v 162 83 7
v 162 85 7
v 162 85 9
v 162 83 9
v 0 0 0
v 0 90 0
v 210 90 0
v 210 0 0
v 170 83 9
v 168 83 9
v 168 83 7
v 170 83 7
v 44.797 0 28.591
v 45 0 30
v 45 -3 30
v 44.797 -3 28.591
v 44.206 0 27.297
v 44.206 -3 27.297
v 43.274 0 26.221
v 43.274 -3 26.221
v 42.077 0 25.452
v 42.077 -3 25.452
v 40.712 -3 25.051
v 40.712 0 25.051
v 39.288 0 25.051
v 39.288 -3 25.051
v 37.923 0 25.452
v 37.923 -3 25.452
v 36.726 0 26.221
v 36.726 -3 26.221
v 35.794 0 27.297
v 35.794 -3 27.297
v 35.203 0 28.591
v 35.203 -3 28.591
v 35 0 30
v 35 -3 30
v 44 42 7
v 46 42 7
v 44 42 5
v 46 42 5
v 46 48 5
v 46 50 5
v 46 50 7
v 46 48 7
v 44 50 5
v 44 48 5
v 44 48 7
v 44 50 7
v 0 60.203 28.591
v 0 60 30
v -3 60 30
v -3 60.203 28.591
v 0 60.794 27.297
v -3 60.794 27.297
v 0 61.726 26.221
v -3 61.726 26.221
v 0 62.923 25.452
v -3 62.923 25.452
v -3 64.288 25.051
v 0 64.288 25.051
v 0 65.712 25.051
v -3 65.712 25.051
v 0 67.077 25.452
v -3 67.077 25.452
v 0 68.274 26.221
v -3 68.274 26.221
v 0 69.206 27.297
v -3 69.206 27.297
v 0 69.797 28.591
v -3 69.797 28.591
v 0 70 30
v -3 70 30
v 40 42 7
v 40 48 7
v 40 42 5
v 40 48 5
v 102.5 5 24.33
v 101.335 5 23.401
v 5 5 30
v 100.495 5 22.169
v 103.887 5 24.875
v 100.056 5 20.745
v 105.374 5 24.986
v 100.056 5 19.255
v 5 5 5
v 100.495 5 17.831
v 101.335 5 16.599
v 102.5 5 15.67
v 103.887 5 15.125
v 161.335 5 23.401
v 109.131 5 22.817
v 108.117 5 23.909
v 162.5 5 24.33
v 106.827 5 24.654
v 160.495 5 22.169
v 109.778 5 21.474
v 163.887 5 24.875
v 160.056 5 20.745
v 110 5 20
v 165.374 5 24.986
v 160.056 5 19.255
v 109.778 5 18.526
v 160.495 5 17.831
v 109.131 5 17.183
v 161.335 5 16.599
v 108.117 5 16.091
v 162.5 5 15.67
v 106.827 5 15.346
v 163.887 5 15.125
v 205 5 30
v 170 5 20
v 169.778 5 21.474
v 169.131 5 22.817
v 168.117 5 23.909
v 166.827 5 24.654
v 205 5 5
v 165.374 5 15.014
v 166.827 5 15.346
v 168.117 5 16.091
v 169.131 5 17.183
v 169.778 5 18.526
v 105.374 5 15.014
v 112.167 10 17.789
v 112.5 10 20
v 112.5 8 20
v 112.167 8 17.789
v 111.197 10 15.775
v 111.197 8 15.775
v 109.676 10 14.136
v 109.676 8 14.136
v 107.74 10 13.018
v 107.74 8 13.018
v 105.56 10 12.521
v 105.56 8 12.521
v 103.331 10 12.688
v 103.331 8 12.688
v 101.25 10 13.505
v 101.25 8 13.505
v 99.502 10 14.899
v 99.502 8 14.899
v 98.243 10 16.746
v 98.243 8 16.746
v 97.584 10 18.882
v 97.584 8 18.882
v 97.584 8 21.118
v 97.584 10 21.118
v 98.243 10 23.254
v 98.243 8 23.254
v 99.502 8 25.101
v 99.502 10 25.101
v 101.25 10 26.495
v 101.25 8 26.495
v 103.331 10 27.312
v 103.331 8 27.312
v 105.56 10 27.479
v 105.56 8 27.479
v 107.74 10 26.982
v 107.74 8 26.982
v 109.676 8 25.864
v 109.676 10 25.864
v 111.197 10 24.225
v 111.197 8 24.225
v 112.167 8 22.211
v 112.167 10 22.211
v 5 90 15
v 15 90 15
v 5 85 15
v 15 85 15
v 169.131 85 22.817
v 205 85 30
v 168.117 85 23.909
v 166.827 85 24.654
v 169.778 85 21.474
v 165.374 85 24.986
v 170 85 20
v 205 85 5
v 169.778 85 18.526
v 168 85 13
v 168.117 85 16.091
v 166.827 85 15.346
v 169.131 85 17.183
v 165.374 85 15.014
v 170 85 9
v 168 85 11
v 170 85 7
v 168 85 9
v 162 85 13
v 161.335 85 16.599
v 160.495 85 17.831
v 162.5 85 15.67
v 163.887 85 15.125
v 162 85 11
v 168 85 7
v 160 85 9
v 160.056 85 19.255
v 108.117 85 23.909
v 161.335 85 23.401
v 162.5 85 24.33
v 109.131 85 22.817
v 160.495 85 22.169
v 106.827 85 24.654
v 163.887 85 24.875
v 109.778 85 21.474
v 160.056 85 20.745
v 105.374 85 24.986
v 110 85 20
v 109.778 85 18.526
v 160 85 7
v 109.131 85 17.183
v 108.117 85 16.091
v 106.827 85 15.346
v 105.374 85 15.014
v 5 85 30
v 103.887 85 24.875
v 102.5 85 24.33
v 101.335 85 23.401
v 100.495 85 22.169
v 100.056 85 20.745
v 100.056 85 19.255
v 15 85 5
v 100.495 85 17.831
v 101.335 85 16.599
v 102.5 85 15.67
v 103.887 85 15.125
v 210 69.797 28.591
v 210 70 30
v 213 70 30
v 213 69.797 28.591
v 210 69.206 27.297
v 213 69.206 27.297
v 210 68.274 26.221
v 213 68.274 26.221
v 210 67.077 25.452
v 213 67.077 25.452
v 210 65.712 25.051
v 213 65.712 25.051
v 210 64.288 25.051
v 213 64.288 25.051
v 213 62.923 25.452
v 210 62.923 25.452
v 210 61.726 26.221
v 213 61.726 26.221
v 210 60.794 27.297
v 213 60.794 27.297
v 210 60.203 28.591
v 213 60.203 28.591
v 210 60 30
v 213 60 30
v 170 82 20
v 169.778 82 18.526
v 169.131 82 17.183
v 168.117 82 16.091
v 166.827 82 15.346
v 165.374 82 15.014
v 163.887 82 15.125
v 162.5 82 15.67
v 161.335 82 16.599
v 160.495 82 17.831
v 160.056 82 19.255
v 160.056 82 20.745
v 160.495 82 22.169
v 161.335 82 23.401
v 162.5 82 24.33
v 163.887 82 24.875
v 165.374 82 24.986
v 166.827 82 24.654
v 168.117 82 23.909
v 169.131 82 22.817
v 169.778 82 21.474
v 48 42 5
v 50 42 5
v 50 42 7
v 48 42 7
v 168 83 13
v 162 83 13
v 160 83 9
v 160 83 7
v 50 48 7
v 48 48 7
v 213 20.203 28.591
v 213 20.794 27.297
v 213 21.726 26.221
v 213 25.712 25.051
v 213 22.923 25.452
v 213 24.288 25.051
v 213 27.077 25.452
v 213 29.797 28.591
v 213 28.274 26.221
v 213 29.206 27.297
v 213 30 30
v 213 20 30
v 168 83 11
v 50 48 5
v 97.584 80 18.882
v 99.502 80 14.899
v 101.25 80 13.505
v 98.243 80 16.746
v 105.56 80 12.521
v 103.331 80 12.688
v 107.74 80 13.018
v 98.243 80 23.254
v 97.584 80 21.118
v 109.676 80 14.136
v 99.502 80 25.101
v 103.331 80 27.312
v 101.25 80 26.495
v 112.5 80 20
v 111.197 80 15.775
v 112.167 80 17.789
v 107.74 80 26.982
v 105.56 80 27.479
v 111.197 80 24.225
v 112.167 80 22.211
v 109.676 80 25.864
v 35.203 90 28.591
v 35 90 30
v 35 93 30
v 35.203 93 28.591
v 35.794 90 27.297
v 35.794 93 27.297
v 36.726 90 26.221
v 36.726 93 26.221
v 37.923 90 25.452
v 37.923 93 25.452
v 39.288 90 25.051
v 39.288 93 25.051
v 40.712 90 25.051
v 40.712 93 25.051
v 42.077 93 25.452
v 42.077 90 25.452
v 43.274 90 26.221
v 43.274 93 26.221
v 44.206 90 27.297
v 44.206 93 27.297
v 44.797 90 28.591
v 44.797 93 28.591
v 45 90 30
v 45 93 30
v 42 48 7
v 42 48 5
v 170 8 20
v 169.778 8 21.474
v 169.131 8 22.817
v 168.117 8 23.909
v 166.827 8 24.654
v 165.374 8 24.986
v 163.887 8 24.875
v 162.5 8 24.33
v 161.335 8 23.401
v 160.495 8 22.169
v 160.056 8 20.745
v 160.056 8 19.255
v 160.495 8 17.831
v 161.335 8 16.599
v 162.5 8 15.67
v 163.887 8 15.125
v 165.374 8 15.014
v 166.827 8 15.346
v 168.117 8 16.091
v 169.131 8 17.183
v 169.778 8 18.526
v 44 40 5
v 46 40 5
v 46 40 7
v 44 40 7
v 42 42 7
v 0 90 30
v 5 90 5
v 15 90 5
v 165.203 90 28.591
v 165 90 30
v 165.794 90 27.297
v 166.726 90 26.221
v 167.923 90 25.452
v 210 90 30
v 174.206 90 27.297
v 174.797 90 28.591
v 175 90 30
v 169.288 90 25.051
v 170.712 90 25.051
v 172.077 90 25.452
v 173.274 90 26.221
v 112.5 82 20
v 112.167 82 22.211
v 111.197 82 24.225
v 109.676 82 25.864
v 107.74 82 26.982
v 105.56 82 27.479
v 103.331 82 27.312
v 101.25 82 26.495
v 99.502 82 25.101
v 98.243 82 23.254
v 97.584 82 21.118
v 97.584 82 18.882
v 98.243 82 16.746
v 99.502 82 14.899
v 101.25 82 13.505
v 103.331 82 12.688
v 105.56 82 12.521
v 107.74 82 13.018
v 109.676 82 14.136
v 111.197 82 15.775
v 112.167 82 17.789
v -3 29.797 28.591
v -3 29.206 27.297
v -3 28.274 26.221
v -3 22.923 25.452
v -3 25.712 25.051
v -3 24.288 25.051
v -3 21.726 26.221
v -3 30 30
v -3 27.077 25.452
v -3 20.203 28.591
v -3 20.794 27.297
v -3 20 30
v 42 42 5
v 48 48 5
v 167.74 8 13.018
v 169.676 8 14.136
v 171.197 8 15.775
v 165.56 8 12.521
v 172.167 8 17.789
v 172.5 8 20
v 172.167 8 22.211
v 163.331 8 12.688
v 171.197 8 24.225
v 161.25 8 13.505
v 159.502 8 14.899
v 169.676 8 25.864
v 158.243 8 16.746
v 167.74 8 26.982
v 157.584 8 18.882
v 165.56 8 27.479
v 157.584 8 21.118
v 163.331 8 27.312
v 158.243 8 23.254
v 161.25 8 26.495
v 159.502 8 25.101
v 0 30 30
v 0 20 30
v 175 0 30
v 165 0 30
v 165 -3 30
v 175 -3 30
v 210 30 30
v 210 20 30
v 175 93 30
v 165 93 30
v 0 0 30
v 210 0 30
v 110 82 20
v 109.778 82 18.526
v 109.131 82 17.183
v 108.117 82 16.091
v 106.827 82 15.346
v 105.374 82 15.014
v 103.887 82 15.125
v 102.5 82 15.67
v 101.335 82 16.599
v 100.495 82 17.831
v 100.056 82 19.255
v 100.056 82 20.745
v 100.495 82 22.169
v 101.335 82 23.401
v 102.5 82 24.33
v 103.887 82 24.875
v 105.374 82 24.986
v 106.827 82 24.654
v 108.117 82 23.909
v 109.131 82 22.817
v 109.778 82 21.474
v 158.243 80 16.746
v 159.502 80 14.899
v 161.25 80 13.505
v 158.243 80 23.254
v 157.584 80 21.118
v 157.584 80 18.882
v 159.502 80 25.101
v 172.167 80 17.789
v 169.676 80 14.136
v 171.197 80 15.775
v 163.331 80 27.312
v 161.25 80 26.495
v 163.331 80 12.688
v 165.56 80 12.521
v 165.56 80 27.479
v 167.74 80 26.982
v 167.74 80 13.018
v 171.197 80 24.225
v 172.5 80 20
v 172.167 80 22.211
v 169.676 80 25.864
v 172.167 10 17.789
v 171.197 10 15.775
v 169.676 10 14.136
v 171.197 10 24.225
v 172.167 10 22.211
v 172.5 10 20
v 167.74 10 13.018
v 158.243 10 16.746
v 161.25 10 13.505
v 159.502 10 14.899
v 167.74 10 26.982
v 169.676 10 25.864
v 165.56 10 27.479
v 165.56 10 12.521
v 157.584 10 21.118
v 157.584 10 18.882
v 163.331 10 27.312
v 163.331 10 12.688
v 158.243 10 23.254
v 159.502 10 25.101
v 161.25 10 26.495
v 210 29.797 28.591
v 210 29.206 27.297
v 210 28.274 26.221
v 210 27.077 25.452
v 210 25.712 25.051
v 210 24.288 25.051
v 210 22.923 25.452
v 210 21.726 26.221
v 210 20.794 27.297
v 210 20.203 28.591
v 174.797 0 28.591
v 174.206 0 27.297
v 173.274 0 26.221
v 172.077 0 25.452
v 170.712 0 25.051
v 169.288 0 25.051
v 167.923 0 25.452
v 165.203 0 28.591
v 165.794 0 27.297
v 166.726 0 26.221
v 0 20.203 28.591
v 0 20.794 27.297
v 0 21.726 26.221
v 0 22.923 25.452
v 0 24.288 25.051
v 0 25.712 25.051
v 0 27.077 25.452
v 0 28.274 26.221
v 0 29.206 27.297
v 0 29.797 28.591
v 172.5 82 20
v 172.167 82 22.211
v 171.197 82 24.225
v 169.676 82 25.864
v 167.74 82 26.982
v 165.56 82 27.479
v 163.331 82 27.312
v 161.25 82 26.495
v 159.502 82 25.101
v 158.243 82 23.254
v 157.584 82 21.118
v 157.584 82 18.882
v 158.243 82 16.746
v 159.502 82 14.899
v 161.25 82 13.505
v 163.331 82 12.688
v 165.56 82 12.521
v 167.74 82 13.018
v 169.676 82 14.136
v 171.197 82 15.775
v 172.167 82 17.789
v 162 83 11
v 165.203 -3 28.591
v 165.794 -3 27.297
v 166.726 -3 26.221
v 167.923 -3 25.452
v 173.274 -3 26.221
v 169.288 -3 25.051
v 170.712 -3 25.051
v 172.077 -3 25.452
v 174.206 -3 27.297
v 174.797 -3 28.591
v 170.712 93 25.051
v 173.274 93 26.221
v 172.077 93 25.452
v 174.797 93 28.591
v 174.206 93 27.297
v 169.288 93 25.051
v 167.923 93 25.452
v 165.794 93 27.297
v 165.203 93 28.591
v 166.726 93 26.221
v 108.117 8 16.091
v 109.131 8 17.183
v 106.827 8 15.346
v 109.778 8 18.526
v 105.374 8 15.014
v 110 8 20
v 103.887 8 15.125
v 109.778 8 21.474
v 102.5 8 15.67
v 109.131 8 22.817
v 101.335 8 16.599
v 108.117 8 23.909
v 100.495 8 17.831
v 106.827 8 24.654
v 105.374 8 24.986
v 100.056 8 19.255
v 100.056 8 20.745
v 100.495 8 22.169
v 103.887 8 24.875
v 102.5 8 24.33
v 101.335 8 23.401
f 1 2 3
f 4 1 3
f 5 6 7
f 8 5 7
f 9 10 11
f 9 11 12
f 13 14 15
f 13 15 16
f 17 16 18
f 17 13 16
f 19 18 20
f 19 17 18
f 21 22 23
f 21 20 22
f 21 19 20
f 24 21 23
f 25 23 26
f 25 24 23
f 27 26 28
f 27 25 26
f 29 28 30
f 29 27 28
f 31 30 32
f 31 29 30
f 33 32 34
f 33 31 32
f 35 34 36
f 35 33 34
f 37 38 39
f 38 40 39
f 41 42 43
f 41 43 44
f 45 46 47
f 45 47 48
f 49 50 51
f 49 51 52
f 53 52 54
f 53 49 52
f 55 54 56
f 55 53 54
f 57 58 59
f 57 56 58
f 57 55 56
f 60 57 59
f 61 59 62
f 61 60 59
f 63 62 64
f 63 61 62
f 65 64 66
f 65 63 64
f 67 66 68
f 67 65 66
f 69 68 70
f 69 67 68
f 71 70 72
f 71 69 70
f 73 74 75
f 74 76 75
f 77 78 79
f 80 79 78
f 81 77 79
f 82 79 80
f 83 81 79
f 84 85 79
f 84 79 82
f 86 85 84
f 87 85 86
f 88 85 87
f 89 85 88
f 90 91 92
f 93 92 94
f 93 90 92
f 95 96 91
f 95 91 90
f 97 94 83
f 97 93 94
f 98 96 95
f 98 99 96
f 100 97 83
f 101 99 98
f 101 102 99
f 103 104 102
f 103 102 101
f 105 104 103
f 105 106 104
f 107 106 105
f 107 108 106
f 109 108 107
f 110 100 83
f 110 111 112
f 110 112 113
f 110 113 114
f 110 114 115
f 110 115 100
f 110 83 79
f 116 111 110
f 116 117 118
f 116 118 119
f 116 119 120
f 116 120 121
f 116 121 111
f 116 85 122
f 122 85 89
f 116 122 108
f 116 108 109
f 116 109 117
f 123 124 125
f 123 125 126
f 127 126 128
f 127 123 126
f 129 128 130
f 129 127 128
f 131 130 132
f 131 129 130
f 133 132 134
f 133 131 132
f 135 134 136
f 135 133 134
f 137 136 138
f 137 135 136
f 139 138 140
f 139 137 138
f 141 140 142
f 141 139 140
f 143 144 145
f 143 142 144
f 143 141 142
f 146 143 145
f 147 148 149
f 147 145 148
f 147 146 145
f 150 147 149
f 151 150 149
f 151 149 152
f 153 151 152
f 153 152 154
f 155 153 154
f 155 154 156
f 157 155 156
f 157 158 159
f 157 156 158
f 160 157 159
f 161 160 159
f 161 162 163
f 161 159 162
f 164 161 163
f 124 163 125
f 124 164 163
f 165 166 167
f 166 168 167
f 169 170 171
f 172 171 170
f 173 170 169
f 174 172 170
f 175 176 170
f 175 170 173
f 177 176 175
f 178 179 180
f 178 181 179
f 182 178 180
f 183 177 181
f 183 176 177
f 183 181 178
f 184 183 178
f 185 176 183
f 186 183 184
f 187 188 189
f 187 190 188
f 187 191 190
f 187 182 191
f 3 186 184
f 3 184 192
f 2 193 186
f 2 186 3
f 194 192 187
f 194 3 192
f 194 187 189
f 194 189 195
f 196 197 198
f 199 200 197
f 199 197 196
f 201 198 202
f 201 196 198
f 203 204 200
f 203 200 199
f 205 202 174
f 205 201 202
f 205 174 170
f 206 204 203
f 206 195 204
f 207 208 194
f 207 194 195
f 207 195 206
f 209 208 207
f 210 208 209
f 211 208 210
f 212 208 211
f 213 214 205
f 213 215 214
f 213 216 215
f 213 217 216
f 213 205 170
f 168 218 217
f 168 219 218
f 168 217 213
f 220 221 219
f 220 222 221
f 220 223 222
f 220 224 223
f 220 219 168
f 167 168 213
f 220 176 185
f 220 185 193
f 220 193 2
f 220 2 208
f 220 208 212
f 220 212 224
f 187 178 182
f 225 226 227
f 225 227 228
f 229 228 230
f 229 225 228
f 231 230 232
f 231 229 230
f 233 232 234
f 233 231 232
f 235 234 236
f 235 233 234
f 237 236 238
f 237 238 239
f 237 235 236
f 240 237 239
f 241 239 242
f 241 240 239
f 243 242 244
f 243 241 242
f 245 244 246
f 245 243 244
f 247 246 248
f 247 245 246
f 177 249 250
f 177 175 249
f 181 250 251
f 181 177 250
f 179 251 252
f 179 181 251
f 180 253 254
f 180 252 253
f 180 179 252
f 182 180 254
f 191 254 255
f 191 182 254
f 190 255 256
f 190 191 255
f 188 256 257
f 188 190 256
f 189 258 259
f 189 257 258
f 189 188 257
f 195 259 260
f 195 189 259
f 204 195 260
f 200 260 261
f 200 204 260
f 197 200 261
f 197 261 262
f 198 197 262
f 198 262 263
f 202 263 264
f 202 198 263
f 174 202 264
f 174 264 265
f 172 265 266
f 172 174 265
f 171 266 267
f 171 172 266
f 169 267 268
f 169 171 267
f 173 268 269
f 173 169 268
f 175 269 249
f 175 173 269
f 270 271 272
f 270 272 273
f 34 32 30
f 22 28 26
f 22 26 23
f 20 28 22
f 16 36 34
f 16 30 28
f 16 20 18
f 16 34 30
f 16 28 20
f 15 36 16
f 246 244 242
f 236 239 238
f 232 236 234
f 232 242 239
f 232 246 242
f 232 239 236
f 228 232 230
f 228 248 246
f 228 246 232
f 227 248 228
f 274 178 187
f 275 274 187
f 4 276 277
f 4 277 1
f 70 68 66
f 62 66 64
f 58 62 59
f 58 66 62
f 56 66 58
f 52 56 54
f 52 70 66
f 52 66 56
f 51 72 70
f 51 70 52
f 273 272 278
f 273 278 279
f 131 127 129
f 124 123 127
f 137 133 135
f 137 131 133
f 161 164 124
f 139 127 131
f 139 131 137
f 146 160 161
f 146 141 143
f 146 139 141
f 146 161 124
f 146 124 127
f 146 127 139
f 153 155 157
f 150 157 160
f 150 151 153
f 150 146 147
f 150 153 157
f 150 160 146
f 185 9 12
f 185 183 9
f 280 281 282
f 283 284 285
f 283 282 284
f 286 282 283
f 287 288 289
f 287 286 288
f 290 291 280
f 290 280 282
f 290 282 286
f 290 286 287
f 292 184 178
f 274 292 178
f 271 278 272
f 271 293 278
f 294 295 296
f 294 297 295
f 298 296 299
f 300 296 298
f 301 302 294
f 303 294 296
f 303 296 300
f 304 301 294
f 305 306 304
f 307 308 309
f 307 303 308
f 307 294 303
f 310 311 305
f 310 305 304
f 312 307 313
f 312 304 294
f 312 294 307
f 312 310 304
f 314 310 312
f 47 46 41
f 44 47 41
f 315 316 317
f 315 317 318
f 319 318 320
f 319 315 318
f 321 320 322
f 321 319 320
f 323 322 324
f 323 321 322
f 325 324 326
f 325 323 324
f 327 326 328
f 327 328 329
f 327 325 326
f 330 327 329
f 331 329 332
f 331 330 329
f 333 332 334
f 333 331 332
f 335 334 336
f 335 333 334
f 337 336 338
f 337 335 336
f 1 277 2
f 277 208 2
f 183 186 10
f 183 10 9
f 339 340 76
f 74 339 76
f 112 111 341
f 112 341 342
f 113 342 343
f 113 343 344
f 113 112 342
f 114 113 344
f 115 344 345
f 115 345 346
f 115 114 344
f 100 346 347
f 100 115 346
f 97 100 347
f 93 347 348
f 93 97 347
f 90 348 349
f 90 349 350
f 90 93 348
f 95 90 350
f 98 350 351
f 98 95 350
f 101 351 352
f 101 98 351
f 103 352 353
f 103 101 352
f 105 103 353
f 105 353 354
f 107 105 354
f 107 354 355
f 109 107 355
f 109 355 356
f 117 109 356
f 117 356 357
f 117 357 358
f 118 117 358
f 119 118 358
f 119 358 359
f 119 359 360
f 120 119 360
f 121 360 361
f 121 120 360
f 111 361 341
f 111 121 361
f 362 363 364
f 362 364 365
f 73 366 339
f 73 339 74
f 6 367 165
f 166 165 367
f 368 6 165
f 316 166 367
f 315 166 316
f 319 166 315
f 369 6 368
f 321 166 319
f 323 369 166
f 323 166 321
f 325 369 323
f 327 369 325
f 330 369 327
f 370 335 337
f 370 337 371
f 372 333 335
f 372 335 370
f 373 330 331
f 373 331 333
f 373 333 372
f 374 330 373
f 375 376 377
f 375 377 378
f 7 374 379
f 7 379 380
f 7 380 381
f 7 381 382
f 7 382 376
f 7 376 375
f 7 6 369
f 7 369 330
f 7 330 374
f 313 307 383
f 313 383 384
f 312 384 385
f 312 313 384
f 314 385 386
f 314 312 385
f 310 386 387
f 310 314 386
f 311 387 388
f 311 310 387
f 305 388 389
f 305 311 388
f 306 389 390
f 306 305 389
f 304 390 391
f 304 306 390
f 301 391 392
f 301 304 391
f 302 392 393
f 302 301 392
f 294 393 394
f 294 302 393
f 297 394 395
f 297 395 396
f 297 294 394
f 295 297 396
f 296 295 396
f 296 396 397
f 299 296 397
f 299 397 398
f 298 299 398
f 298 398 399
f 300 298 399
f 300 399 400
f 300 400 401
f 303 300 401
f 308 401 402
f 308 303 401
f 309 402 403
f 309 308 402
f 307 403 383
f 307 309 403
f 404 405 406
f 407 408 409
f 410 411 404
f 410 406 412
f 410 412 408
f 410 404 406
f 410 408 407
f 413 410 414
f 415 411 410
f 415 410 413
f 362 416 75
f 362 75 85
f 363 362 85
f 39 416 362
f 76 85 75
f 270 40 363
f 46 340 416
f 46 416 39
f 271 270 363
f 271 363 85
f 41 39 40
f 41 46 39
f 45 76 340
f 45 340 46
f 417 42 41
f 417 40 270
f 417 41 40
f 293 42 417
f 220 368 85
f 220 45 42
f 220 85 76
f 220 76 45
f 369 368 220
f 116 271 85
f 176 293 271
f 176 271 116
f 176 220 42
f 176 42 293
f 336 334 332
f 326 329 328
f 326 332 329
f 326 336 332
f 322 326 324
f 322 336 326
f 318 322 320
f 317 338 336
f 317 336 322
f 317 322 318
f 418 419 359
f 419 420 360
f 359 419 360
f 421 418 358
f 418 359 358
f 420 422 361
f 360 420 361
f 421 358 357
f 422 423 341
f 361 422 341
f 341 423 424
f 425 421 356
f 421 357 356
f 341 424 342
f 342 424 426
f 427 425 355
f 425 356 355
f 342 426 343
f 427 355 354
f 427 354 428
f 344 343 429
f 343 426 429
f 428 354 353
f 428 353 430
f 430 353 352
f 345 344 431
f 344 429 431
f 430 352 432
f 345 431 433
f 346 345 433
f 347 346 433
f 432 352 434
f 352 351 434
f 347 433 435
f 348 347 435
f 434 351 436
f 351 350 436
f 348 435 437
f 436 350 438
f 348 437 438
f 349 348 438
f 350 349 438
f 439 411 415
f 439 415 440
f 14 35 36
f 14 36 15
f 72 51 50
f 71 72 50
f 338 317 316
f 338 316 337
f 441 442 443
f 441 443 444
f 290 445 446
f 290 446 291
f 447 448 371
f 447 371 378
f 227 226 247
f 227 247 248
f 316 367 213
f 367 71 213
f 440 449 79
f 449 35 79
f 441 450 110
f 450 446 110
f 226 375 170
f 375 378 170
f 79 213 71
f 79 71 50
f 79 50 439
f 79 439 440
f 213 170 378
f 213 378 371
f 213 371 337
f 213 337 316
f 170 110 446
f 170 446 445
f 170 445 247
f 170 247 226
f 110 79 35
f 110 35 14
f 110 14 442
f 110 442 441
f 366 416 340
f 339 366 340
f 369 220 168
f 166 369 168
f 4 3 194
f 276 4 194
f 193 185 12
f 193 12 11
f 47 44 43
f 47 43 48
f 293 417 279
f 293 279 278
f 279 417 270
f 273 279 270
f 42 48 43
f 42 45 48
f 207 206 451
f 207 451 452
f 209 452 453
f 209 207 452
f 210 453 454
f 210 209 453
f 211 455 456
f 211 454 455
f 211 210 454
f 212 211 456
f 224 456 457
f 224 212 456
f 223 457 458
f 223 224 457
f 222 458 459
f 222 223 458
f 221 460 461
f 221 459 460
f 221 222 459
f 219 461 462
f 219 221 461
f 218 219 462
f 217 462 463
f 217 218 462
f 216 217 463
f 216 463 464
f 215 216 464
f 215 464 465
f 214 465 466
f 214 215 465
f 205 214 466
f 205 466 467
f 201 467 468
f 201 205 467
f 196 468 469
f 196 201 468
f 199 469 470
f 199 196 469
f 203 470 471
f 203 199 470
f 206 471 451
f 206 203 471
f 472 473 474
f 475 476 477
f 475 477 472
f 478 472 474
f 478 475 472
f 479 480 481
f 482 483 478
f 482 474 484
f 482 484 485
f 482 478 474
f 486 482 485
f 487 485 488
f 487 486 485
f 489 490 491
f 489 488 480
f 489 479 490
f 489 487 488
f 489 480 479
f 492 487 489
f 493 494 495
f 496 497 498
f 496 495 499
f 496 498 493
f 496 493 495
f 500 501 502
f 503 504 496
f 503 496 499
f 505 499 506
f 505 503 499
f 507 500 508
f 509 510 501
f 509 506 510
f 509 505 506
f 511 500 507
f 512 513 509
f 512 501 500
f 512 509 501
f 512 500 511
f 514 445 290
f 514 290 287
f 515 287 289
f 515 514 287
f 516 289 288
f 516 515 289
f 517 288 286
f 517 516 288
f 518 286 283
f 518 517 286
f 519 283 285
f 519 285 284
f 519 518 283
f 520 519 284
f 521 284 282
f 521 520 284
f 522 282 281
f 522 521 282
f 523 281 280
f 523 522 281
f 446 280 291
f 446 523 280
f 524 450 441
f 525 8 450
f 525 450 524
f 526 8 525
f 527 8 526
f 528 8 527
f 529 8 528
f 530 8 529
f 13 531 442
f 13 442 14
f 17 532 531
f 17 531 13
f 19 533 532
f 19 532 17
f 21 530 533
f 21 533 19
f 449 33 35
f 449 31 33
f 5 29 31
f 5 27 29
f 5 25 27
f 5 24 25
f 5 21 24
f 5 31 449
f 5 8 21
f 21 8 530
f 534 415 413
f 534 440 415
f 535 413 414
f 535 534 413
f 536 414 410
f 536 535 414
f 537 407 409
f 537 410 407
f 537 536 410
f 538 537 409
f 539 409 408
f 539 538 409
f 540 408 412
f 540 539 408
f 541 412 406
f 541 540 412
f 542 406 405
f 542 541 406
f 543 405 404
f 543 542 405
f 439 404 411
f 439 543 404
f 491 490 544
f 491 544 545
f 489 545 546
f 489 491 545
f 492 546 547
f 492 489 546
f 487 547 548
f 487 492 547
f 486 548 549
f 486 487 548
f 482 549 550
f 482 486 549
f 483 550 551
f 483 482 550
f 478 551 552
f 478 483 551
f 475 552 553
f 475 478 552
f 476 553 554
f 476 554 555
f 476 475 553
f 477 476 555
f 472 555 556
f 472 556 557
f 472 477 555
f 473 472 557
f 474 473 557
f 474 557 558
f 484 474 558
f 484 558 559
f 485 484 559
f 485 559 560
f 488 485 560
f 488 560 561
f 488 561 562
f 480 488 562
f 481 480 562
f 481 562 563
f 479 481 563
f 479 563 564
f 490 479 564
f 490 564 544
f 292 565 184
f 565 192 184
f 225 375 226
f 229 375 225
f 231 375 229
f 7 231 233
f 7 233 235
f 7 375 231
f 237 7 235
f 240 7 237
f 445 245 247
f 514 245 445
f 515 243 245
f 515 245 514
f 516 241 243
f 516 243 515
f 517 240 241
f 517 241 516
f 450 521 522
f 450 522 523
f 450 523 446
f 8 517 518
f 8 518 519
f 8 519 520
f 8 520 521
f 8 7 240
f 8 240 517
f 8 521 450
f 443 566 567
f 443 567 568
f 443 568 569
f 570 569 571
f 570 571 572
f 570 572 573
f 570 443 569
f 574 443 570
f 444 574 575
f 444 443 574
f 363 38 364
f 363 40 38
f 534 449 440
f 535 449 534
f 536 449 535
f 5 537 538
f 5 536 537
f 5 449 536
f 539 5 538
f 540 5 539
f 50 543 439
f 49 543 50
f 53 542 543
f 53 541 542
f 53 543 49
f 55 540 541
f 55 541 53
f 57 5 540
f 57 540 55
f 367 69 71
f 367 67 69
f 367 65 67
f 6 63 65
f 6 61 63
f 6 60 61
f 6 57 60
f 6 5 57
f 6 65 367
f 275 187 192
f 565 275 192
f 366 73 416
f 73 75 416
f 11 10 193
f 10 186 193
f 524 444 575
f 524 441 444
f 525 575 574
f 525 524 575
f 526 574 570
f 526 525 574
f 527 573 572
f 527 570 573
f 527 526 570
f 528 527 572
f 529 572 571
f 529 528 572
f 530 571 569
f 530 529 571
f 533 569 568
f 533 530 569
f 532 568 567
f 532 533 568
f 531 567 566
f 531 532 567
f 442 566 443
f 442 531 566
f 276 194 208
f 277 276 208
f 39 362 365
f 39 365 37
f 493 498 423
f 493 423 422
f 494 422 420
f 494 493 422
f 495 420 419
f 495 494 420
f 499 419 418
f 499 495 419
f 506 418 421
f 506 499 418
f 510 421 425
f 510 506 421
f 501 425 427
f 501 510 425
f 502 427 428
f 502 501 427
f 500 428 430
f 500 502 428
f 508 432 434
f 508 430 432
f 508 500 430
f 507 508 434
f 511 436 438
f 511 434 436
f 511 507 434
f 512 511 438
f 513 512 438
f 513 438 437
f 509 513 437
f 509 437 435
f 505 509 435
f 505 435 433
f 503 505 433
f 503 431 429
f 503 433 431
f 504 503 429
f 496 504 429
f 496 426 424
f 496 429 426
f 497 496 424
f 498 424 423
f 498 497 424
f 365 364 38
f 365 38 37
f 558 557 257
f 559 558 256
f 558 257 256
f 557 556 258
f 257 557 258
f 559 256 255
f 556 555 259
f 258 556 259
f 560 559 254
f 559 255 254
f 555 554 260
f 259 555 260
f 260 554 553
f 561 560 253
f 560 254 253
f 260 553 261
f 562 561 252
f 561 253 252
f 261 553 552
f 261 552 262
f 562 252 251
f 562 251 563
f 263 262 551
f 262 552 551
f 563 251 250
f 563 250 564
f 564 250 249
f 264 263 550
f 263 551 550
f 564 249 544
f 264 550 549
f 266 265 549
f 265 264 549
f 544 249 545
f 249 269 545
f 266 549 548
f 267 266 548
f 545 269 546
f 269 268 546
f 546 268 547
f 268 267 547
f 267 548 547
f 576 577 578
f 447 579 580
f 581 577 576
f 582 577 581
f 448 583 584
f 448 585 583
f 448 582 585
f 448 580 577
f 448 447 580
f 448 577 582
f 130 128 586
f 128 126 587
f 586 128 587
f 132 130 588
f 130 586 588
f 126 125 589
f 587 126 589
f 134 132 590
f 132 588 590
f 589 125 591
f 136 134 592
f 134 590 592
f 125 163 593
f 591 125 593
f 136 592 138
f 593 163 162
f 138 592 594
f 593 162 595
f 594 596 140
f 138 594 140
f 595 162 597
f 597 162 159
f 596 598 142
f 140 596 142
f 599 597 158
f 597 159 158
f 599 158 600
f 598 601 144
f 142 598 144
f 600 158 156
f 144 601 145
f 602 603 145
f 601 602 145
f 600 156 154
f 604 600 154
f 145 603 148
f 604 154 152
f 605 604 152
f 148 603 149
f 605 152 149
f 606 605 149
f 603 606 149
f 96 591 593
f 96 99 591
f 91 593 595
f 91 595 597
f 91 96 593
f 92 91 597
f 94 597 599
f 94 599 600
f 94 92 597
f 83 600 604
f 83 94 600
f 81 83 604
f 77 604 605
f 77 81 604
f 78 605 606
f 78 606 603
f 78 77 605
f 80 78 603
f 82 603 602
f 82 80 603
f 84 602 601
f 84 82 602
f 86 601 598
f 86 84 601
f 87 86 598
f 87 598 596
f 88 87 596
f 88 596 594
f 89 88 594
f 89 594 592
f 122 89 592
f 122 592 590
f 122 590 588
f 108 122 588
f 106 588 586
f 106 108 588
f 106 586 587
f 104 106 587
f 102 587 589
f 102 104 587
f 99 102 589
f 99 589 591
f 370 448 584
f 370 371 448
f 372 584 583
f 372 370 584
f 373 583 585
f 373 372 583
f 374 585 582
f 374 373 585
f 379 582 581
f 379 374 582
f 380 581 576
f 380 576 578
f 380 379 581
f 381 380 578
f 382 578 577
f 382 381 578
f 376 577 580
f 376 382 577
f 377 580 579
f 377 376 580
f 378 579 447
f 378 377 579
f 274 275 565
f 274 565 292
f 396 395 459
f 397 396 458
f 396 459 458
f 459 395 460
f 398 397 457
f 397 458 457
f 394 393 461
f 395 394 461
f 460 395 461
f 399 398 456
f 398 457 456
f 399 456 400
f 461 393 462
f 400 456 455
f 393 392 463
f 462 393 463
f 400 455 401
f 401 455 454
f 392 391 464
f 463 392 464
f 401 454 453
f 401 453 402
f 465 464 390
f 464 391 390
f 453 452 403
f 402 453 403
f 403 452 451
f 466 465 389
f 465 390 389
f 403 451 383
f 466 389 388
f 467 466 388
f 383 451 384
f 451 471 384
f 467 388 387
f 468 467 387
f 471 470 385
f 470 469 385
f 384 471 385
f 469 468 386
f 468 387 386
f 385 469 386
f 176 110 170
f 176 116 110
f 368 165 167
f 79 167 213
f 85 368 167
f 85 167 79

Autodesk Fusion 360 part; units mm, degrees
sketch "Sketch1" plane through (0, 0, 0) normal (0, 0, 1) x (1, 0, 0)
  line L0 (0, 90) -> (210, 90)
  line L1 (210, 90) -> (210, 0)
  line L2 (210, 0) -> (0, 0)
  line L3 (0, 0) -> (0, 90)
  line L4 (5, 5) -> (205, 5)
  line L5 (205, 5) -> (205, 85)
  line L6 (205, 85) -> (5, 85)
  line L7 (5, 85) -> (5, 5)
  dimension "d1" = 210
  dimension "d2" = 90
  dimension "d3" = 200
  dimension "d4" = 80
  dimension "d5" = 5
  dimension "d6" = 5
extrude "Extrude1" add sketch "Sketch1" along normal blind 5 contours L4 L5 L6 L7
extrude "Extrude2" add sketch "Sketch1" along normal blind 30
sketch "Sketch3" plane through (0, 85, 0) normal (0, -1, 0) x (1, 0, 0)
  line L0 (5, 5) -> (205, 5)
  line L1 (205, 5) -> (205, 30)
  line L2 (205, 30) -> (5, 30)
  line L3 (5, 30) -> (5, 5)
  circle A0 centre (105, 20) radius 5
  line L4 (210, 0) -> (210, 30)
  circle A1 centre (165, 20) radius 5
  dimension "d15" = 10
  dimension "d16" = 10
  dimension "d17" = 105
  dimension "d80" = 10
  dimension "d81" = 60
extrude "Extrude3" add sketch "Sketch3" along normal blind 5 contours A0
sketch "Sketch4" plane through (0, 80, 0) normal (0, -1, 0) x (1, 0, 0)
  circle A0 centre (105, 20) radius 5
  circle A1 centre (105, 20) radius 7.5
  dimension "d20" = 15
extrude "Extrude4" add sketch "Sketch4" against normal blind 2
sketch "Sketch6" plane through (0, 85, 0) normal (0, -1, 0) x (1, 0, 0)
  circle A0 centre (105, 20) radius 5
  line L0 (5, 5) -> (205, 5)
  line L1 (205, 5) -> (205, 30)
  line L2 (205, 30) -> (5, 30)
  line L3 (5, 30) -> (5, 5)
  line L4 (162, 11) -> (168, 11)
  line L5 (168, 11) -> (168, 5)
  line L6 (168, 5) -> (162, 5)
  line L7 (162, 5) -> (162, 11)
  line L8 (5, 5) -> (205, 5)
  line L9 (210, 0) -> (210, 30)
  line L10 (162, 11) -> (168, 11)
  line L11 (168, 11) -> (168, 13)
  line L12 (168, 13) -> (162, 13)
  line L13 (162, 13) -> (162, 11)
  line L14 (168, 9) -> (170, 9)
  line L15 (170, 9) -> (170, 7)
  line L16 (170, 7) -> (168, 7)
  line L17 (168, 7) -> (168, 9)
  line L18 (162, 9) -> (160, 9)
  line L19 (160, 9) -> (160, 7)
  line L20 (160, 7) -> (162, 7)
  line L21 (162, 7) -> (162, 9)
  dimension "d91" = 6
  dimension "d92" = 6
  dimension "d93" = 42
  dimension "d94" = 2
  dimension "d95" = 2
  dimension "d96" = 2
  dimension "d97" = 2
  dimension "d98" = 2
  dimension "d99" = 2
  dimension "d100" = 2
sketch "Sketch7" plane through (0, 0, 0) normal (-1, 0, 0) x (0, -1, 0)
  line L0 (-90, 0) -> (0, 0)
  line L1 (0, 0) -> (0, 30)
  line L2 (0, 30) -> (-90, 30)
  line L3 (-90, 30) -> (-90, 0)
  circle A0 centre (-25, 30) radius 5
  line L4 (-30, 30) -> (-20, 30)
  circle A1 centre (-65, 30) radius 5
  line L5 (-70, 30) -> (-60, 30)
  dimension "d31" = 10
  dimension "d32" = 10
  dimension "d47" = 25
  dimension "d48" = 25
extrude "Extrude5" add sketch "Sketch7" along normal blind 3 contours L2 A1 L5 | L2 A0 L4 picked at (-66.5016, 29.2769) picked at (-23.5675, 28.3215)
ref_plane "WorkPlane1" through (0, 45, 0) normal (0, 1, 0) x (0, 0, 1)
mirror "Mirror1" about plane through (0, 45, 0) normal (0, 1, 0) of bodies 1 merged
ref_plane "WorkPlane2" through (105, 45, 15) normal (-1, 0, 0) x (0, -1, 0)
mirror "Mirror2" about plane through (105, 45, 15) normal (-1, 0, 0) of bodies 1 merged
sketch "Sketch8" plane through (0, 0, 0) normal (0, -1, 0) x (1, 0, 0)
  line L0 (0, 0) -> (210, 0)
  line L1 (210, 0) -> (210, 30)
  line L2 (210, 30) -> (0, 30)
  line L3 (0, 30) -> (0, 0)
  circle A0 centre (40, 30) radius 5
  circle A1 centre (170, 30) radius 5
  line L4 (35, 30) -> (45, 30)
  line L5 (165, 30) -> (175, 30)
  dimension "d39" = 10
  dimension "d40" = 10
  dimension "d41" = 40
  dimension "d42" = 40
extrude "Extrude6" add sketch "Sketch8" along normal blind 3 contours L2 A0 L4 | L2 A1 L5 picked at (38.7453, 27.2668) picked at (169.3911, 27.9517)
mirror "Mirror3" about plane through (0, 45, 0) normal (0, 1, 0) of bodies 1 merged
sketch "Sketch9" plane through (105, 85, 17.5) normal (0, -1, 0) x (1, 0, 0)
  line L0 (-100, -12.5) -> (-90, -12.5)
  line L1 (-90, -12.5) -> (-90, -2.5)
  line L2 (-90, -2.5) -> (-100, -2.5)
  line L3 (-100, -2.5) -> (-100, -12.5)
  line L4 (105, -17.5) -> (-105, -17.5)
  point P0 (-105, -17.5)
  dimension "d49" = 10
  dimension "d50" = 10
  dimension "d51" = 5
  dimension "d52" = 5
sketch "Sketch10" plane through (0, 0, 5) normal (0, 0, 1) x (-1, 0, 0)
  line L0 (-5, -85) -> (-5, -5)
  line L1 (-5, -5) -> (-205, -5)
  line L2 (-205, -5) -> (-205, -85)
  line L3 (-205, -85) -> (-5, -85)
  circle A0 centre (-45, -45) radius 20
  circle A1 centre (-105, -45) radius 20
  circle A2 centre (-165, -45) radius 20
  line L4 (-210, -90) -> (-210, 0)
  line L5 (-210, 0) -> (0, 0)
  line L6 (-42, -48) -> (-48, -48)
  line L7 (-48, -48) -> (-48, -42)
  line L8 (-48, -42) -> (-42, -42)
  line L9 (-42, -42) -> (-42, -48)
  line L10 (-48, -48) -> (-50, -48)
  line L11 (-50, -48) -> (-50, -42)
  line L12 (-50, -42) -> (-48, -42)
  line L13 (-48, -42) -> (-48, -48)
  line L14 (-42, -48) -> (-40, -48)
  line L15 (-40, -48) -> (-40, -42)
  line L16 (-40, -42) -> (-42, -42)
  line L17 (-42, -42) -> (-42, -48)
  line L18 (-44, -50) -> (-46, -50)
  line L19 (-46, -50) -> (-46, -48)
  line L20 (-46, -48) -> (-44, -48)
  line L21 (-44, -48) -> (-44, -50)
  line L22 (-44, -42) -> (-46, -42)
  line L23 (-46, -42) -> (-46, -40)
  line L24 (-46, -40) -> (-44, -40)
  line L25 (-44, -40) -> (-44, -42)
  dimension "d55" = 40
  dimension "d56" = 40
  dimension "d57" = 40
  dimension "d58" = 105
  dimension "d59" = 60
  dimension "d60" = 60
  dimension "d61" = 45
  dimension "d62" = 45
  dimension "d63" = 45
  dimension "d64" = 6
  dimension "d65" = 6
  dimension "d66" = 3
  dimension "d67" = 3
  dimension "d68" = 2
  dimension "d69" = 2
  dimension "d70" = 2
  dimension "d71" = 2
  dimension "d72" = 2
  dimension "d73" = 2
  dimension "d74" = 2
  dimension "d75" = 2
  dimension "d76" = 6
extrude "Extrude8" add sketch "Sketch10" along normal blind 2 contours L9 L14 L15 L16 L17 | L6 L18 L19 L20 L21 | L8 L22 L23 L24 L25 | L7 L10 L11 L12 L13
extrude "Extrude9" add sketch "Sketch3" along normal blind 5 contours A1
sketch "Sketch11" plane through (0, 80, 0) normal (0, -1, 0) x (1, 0, 0)
  circle A0 centre (165, 20) radius 5
  circle A1 centre (165, 20) radius 7.5
  dimension "d84" = 15
extrude "Extrude10" add sketch "Sketch11" against normal blind 2
mirror "Mirror4" about plane through (0, 45, 0) normal (0, 1, 0) of bodies 1 merged
extrude "Extrude11" cut sketch "Sketch9" against normal blind 5
extrude "Extrude12" add sketch "Sketch6" along normal blind 2 contours L7 L18 L19 L20 L21 | L5 L14 L15 L16 L17 | L4 L10 L11 L12 L13
